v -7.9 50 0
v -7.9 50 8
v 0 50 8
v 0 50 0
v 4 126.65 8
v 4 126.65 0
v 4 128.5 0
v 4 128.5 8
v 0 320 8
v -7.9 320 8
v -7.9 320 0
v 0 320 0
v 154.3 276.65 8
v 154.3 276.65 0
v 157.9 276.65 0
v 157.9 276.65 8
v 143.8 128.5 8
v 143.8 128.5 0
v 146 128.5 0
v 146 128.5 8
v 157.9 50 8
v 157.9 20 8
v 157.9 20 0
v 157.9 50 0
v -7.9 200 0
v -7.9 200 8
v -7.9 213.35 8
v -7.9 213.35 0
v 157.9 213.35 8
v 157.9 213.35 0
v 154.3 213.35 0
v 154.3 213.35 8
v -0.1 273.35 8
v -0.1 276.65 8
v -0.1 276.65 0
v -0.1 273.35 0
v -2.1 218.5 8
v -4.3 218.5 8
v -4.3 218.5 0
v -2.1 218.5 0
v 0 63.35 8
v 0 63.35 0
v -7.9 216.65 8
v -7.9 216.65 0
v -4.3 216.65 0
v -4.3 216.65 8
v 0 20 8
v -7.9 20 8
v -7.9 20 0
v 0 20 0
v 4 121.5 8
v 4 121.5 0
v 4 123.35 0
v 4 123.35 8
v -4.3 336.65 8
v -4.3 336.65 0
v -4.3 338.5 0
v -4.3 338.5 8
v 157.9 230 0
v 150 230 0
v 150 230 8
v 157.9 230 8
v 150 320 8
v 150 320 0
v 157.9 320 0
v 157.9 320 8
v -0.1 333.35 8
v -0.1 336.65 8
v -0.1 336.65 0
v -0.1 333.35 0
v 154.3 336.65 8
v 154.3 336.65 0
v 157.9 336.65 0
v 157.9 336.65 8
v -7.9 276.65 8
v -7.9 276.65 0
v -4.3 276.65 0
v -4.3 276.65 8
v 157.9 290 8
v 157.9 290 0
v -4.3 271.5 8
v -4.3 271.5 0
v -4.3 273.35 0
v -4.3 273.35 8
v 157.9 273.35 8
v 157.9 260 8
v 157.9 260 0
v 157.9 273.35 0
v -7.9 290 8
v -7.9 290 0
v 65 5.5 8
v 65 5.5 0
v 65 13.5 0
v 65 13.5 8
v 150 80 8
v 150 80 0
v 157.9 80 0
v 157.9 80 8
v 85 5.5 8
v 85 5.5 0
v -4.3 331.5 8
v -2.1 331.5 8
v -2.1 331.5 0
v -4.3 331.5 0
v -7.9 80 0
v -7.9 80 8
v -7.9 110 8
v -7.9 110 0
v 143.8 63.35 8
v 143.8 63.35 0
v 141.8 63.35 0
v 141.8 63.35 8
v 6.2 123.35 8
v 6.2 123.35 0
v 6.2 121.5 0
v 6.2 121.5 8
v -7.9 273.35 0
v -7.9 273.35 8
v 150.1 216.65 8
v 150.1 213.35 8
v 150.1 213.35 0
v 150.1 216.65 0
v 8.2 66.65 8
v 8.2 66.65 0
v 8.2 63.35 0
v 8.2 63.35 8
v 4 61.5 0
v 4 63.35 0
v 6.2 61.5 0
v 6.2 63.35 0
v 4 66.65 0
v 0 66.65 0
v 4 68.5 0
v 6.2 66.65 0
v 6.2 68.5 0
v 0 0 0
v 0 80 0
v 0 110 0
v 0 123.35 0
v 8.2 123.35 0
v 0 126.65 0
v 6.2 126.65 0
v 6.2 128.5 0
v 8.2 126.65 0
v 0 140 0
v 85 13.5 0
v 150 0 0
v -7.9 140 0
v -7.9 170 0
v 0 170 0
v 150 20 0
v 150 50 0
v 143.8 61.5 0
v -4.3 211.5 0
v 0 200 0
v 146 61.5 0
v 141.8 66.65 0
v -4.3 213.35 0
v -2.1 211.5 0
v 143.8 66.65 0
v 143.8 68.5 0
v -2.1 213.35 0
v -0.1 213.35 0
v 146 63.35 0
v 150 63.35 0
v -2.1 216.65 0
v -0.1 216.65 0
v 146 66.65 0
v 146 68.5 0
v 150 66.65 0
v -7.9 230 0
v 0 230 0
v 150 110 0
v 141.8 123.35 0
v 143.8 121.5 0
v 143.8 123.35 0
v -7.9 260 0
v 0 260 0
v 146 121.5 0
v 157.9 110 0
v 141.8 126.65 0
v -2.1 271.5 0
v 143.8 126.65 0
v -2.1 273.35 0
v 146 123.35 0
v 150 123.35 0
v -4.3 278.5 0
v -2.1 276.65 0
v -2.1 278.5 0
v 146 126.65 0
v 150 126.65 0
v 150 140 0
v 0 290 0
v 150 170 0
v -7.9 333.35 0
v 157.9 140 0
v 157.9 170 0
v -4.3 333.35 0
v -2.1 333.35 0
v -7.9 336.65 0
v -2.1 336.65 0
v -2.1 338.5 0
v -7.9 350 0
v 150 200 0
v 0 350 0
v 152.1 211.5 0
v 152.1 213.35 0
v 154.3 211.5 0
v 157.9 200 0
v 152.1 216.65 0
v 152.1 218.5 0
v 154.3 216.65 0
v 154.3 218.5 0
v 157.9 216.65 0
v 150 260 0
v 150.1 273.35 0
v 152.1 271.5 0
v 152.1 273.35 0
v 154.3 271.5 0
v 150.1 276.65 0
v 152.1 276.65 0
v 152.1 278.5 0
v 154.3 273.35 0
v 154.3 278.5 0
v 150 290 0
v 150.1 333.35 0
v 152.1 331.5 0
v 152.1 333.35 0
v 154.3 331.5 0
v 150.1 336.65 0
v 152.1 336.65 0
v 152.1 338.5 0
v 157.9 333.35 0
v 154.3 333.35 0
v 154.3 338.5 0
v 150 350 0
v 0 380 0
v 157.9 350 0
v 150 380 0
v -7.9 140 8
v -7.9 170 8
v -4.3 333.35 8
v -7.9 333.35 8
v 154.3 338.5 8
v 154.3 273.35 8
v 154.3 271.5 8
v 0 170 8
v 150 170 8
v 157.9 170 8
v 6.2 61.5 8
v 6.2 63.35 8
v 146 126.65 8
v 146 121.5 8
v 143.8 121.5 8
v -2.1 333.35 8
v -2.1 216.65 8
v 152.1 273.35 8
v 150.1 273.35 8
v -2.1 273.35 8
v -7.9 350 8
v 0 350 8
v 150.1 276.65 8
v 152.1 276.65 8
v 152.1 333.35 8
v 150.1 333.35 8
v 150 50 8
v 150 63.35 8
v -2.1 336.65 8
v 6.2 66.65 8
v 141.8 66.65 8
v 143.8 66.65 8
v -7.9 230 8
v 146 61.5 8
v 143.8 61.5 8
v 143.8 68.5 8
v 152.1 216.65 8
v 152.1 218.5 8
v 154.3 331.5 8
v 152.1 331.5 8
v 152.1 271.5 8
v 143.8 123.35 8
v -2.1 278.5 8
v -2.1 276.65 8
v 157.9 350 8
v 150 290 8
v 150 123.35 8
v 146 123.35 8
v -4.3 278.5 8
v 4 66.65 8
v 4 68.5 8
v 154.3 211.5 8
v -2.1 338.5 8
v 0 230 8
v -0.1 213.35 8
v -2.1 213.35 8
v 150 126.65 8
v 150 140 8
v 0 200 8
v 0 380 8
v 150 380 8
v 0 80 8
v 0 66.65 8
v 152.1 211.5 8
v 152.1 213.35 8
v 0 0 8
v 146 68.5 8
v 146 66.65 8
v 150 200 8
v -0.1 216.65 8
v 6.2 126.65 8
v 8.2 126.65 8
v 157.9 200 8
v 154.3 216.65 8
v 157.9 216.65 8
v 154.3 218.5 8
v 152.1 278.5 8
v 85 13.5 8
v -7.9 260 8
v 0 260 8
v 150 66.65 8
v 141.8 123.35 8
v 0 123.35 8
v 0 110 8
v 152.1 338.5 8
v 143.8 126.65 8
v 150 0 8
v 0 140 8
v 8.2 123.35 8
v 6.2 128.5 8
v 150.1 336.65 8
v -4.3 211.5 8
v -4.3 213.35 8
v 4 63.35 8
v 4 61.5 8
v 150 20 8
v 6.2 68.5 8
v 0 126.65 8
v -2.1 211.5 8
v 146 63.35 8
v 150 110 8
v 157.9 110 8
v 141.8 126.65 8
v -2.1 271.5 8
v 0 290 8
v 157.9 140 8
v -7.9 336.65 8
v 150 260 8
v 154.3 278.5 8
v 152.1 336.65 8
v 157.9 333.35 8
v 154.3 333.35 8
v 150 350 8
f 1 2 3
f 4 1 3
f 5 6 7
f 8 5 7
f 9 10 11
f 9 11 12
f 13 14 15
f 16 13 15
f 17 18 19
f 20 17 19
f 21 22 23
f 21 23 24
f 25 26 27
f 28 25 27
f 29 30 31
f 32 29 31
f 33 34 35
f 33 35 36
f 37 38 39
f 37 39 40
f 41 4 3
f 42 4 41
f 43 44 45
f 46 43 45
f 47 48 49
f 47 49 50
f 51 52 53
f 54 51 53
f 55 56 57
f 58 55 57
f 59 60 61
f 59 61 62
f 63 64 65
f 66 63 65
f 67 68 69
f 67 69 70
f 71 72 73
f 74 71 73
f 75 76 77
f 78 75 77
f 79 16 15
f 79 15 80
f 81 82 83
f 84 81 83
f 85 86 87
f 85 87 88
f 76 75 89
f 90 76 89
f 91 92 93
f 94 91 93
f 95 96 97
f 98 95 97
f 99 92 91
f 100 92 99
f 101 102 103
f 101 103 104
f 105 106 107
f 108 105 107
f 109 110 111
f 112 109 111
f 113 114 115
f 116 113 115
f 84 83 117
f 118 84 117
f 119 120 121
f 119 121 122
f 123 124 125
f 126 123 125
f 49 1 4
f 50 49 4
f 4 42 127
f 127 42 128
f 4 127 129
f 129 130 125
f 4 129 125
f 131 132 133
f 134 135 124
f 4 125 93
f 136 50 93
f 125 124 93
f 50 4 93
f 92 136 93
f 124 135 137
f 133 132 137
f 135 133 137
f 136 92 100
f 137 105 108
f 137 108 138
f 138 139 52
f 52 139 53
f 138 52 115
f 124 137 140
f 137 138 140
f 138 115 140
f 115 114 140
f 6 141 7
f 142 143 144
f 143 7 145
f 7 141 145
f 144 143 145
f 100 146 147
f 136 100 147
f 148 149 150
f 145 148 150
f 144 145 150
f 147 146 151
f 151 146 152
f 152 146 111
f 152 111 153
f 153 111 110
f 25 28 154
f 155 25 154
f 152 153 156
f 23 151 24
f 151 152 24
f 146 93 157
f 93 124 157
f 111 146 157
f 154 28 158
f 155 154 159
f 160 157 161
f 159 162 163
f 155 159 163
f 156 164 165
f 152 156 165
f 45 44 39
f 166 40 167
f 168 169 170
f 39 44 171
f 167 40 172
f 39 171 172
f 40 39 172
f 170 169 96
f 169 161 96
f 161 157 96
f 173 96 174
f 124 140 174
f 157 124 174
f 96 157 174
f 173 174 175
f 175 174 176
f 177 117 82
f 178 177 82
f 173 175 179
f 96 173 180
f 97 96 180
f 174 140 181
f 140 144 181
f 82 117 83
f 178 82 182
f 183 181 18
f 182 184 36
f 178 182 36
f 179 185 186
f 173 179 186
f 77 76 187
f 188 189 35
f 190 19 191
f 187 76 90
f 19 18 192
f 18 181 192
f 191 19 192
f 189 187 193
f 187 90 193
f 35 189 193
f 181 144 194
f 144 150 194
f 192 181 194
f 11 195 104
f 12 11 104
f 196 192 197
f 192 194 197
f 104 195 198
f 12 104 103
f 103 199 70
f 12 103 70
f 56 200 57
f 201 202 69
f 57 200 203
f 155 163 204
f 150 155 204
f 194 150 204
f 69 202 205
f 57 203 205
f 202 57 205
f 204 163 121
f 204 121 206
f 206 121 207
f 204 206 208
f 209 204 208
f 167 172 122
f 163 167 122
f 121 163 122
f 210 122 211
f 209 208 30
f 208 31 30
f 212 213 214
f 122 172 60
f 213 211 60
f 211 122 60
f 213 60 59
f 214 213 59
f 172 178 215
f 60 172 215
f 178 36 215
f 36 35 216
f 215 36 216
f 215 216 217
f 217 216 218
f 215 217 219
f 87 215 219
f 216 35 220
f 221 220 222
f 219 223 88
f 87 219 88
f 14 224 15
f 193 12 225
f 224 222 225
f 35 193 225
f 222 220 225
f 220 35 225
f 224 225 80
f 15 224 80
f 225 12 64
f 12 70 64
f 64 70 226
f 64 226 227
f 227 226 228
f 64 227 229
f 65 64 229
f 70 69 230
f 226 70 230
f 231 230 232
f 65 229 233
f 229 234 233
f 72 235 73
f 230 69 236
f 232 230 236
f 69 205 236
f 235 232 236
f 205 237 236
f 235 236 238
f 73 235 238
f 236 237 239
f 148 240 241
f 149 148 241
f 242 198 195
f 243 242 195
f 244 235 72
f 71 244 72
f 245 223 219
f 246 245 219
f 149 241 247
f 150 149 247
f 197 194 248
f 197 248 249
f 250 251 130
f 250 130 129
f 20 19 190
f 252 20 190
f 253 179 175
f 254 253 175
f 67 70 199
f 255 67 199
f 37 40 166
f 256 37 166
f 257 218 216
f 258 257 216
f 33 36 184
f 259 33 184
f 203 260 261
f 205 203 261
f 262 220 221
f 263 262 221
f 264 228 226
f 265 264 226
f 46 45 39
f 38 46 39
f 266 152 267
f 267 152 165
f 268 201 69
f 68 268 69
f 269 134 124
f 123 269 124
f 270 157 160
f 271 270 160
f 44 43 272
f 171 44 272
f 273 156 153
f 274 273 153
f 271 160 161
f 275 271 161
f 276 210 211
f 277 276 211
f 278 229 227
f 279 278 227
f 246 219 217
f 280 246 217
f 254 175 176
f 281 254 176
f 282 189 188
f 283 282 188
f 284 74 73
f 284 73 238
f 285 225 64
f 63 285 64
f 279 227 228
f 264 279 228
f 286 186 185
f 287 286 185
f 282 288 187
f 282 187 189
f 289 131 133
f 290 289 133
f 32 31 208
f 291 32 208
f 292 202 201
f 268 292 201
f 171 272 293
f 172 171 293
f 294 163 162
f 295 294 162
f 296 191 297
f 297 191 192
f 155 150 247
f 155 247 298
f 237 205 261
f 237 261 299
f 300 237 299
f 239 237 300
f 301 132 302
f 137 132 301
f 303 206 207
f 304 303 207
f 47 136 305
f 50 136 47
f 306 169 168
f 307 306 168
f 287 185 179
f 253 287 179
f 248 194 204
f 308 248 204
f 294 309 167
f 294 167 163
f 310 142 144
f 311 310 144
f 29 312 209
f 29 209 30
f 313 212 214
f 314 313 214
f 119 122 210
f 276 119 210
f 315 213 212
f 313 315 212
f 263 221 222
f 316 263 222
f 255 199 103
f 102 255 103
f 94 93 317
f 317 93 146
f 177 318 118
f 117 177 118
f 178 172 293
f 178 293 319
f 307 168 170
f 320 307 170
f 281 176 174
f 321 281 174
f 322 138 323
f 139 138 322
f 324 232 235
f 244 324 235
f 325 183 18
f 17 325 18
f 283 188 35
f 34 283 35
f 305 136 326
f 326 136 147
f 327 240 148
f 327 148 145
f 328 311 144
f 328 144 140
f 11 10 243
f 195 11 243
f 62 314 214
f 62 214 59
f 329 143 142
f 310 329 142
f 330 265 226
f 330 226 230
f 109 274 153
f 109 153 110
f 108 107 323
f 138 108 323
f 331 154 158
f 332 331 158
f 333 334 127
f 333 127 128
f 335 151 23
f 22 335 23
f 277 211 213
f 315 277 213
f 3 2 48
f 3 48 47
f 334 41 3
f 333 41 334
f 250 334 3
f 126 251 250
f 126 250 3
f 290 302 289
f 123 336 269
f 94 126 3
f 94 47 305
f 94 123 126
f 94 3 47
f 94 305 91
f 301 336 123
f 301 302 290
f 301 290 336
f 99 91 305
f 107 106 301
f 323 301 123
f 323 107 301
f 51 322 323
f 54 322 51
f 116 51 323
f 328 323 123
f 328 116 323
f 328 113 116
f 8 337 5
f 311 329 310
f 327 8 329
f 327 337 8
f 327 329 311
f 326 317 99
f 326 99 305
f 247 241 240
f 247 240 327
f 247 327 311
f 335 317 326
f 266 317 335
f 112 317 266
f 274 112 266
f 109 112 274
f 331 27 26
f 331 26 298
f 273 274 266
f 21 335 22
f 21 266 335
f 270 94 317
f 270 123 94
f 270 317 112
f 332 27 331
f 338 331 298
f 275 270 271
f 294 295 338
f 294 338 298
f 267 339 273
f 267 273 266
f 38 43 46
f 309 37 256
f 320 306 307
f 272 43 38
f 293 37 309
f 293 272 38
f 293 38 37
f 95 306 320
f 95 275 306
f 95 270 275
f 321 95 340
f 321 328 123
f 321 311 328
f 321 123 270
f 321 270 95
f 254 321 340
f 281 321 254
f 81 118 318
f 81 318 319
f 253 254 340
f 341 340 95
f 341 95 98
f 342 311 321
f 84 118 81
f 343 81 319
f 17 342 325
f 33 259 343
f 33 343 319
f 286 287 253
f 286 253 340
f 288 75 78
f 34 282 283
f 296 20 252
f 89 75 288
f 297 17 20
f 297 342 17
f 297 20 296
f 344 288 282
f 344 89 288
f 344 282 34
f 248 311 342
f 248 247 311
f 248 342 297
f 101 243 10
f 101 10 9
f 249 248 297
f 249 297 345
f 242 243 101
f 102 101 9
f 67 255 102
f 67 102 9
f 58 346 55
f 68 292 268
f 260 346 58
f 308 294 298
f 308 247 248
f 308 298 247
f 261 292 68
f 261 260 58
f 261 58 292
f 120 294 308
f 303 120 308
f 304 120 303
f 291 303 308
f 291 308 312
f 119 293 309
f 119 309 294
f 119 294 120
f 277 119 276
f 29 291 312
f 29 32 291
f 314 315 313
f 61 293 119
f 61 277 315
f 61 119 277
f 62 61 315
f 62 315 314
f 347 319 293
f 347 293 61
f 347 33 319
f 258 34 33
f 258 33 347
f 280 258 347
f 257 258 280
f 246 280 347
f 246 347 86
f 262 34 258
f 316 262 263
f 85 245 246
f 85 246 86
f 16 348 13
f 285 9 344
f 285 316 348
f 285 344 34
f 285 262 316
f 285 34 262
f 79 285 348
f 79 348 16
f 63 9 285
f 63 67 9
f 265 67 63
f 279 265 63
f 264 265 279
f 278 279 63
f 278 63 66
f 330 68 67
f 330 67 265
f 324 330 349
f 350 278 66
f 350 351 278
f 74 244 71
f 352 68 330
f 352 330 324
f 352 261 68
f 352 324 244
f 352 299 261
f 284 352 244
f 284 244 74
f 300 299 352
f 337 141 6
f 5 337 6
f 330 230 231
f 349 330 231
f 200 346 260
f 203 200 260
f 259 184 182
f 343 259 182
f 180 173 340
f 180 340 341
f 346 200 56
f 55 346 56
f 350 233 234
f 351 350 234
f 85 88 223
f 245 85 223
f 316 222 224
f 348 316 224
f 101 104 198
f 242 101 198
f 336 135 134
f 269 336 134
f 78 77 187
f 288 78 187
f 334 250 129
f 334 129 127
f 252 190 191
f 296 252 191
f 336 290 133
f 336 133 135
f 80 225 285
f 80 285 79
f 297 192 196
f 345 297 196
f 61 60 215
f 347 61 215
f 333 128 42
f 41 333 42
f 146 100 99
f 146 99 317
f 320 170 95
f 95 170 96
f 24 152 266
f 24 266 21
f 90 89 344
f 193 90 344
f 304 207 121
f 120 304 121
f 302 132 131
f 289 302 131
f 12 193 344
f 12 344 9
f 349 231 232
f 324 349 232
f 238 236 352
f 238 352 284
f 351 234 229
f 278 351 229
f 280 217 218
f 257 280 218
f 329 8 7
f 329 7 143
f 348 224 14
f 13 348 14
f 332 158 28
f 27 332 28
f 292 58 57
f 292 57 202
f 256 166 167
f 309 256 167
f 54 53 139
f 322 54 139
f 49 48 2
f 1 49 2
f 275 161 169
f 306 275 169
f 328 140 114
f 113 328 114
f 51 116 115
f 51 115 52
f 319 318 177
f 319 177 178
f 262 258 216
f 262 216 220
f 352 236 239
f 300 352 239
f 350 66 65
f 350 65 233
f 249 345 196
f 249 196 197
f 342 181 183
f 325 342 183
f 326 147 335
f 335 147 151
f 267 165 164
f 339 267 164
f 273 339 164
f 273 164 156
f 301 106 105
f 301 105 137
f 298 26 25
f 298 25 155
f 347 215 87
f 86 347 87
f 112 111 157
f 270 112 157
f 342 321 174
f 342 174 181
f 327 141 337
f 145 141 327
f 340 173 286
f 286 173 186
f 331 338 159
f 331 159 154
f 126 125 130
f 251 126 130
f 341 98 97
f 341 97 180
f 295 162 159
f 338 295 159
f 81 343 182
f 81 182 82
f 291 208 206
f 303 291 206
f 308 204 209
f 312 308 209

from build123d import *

# Parameters (mm, degrees)
SKETCH1_W           = 150
SKETCH1_H           = 380
SKETCH1_W_2         = 20
SKETCH1_H_2         = 8
BOSS_EXTRUDE1_DEPTH = 8
SKETCH2_W           = 7.9
SKETCH2_H           = 30
BOSS_EXTRUDE2_DEPTH = 8
CUT_EXTRUDE2_DEPTH  = 9


with BuildPart() as part:
    # Sketch1 → Boss-Extrude1 (new body)
    with BuildSketch(Plane.XY):
        with Locations((75, 190)):
            Rectangle(SKETCH1_W, SKETCH1_H)
        with Locations((75, 9.5)):
            Rectangle(SKETCH1_W_2, SKETCH1_H_2, mode=Mode.SUBTRACT)
    extrude(amount=BOSS_EXTRUDE1_DEPTH)

    # Sketch2 → Boss-Extrude2 (add)
    with BuildSketch(Plane.XY.offset(8)):
        with Locations((153.95, 335)):
            Rectangle(SKETCH2_W, SKETCH2_H)
        with Locations((-3.95, 335)):
            Rectangle(SKETCH2_W, SKETCH2_H)
        with Locations((153.95, 275)):
            Rectangle(SKETCH2_W, SKETCH2_H)
        with Locations((-3.95, 275)):
            Rectangle(SKETCH2_W, SKETCH2_H)
        with Locations((153.95, 215)):
            Rectangle(SKETCH2_W, SKETCH2_H)
        with Locations((-3.95, 215)):
            Rectangle(SKETCH2_W, SKETCH2_H)
        with Locations((153.95, 155)):
            Rectangle(SKETCH2_W, SKETCH2_H)
        with Locations((-3.95, 155)):
            Rectangle(SKETCH2_W, SKETCH2_H)
        with Locations((153.95, 95)):
            Rectangle(SKETCH2_W, SKETCH2_H)
        with Locations((-3.95, 95)):
            Rectangle(SKETCH2_W, SKETCH2_H)
        with Locations((153.95, 35)):
            Rectangle(SKETCH2_W, SKETCH2_H)
        with Locations((-3.95, 35)):
            Rectangle(SKETCH2_W, SKETCH2_H)
    extrude(amount=-BOSS_EXTRUDE2_DEPTH)

    # Sketch3 → Cut-Extrude2 (cut, through all)
    with BuildSketch(Plane(origin=(0, 0, 0), x_dir=(-1, 0, 0), z_dir=(0, 0, -1))):
        Polygon((7.9, 273.35), (7.9, 276.65), (4.3, 276.65), (4.3, 278.5), (2.1, 278.5), (2.1, 276.65), (0.1, 276.65), (0.1, 273.35), (2.1, 273.35), (2.1, 271.5), (4.3, 271.5), (4.3, 273.35), align=None)
        Polygon((7.9, 333.35), (7.9, 336.65), (4.3, 336.65), (4.3, 338.5), (2.1, 338.5), (2.1, 336.65), (0.1, 336.65), (0.1, 333.35), (2.1, 333.35), (2.1, 331.5), (4.3, 331.5), (4.3, 333.35), align=None)
        Polygon((7.9, 213.35), (7.9, 216.65), (4.3, 216.65), (4.3, 218.5), (2.1, 218.5), (2.1, 216.65), (0.1, 216.65), (0.1, 213.35), (2.1, 213.35), (2.1, 211.5), (4.3, 211.5), (4.3, 213.35), align=None)
        Polygon((-157.9, 213.35), (-154.3, 213.35), (-154.3, 211.5), (-152.1, 211.5), (-152.1, 213.35), (-150.1, 213.35), (-150.1, 216.65), (-152.1, 216.65), (-152.1, 218.5), (-154.3, 218.5), (-154.3, 216.65), (-157.9, 216.65), align=None)
        Polygon((-157.9, 273.35), (-154.3, 273.35), (-154.3, 271.5), (-152.1, 271.5), (-152.1, 273.35), (-150.1, 273.35), (-150.1, 276.65), (-152.1, 276.65), (-152.1, 278.5), (-154.3, 278.5), (-154.3, 276.65), (-157.9, 276.65), align=None)
        Polygon((-157.9, 333.35), (-154.3, 333.35), (-154.3, 331.5), (-152.1, 331.5), (-152.1, 333.35), (-150.1, 333.35), (-150.1, 336.65), (-152.1, 336.65), (-152.1, 338.5), (-154.3, 338.5), (-154.3, 336.65), (-157.9, 336.65), align=None)
        Polygon((0, 123.35), (0, 126.65), (-4, 126.65), (-4, 128.5), (-6.2, 128.5), (-6.2, 126.65), (-8.2, 126.65), (-8.2, 123.35), (-6.2, 123.35), (-6.2, 121.5), (-4, 121.5), (-4, 123.35), align=None)
        Polygon((0, 63.35), (0, 66.65), (-4, 66.65), (-4, 68.5), (-6.2, 68.5), (-6.2, 66.65), (-8.2, 66.65), (-8.2, 63.35), (-6.2, 63.35), (-6.2, 61.5), (-4, 61.5), (-4, 63.35), align=None)
        Polygon((-150, 63.35), (-146, 63.35), (-146, 61.5), (-143.8, 61.5), (-143.8, 63.35), (-141.8, 63.35), (-141.8, 66.65), (-143.8, 66.65), (-143.8, 68.5), (-146, 68.5), (-146, 66.65), (-150, 66.65), align=None)
        Polygon((-150, 123.35), (-146, 123.35), (-146, 121.5), (-143.8, 121.5), (-143.8, 123.35), (-141.8, 123.35), (-141.8, 126.65), (-143.8, 126.65), (-143.8, 128.5), (-146, 128.5), (-146, 126.65), (-150, 126.65), align=None)
    extrude(amount=-CUT_EXTRUDE2_DEPTH, mode=Mode.SUBTRACT)


solid = part.part
